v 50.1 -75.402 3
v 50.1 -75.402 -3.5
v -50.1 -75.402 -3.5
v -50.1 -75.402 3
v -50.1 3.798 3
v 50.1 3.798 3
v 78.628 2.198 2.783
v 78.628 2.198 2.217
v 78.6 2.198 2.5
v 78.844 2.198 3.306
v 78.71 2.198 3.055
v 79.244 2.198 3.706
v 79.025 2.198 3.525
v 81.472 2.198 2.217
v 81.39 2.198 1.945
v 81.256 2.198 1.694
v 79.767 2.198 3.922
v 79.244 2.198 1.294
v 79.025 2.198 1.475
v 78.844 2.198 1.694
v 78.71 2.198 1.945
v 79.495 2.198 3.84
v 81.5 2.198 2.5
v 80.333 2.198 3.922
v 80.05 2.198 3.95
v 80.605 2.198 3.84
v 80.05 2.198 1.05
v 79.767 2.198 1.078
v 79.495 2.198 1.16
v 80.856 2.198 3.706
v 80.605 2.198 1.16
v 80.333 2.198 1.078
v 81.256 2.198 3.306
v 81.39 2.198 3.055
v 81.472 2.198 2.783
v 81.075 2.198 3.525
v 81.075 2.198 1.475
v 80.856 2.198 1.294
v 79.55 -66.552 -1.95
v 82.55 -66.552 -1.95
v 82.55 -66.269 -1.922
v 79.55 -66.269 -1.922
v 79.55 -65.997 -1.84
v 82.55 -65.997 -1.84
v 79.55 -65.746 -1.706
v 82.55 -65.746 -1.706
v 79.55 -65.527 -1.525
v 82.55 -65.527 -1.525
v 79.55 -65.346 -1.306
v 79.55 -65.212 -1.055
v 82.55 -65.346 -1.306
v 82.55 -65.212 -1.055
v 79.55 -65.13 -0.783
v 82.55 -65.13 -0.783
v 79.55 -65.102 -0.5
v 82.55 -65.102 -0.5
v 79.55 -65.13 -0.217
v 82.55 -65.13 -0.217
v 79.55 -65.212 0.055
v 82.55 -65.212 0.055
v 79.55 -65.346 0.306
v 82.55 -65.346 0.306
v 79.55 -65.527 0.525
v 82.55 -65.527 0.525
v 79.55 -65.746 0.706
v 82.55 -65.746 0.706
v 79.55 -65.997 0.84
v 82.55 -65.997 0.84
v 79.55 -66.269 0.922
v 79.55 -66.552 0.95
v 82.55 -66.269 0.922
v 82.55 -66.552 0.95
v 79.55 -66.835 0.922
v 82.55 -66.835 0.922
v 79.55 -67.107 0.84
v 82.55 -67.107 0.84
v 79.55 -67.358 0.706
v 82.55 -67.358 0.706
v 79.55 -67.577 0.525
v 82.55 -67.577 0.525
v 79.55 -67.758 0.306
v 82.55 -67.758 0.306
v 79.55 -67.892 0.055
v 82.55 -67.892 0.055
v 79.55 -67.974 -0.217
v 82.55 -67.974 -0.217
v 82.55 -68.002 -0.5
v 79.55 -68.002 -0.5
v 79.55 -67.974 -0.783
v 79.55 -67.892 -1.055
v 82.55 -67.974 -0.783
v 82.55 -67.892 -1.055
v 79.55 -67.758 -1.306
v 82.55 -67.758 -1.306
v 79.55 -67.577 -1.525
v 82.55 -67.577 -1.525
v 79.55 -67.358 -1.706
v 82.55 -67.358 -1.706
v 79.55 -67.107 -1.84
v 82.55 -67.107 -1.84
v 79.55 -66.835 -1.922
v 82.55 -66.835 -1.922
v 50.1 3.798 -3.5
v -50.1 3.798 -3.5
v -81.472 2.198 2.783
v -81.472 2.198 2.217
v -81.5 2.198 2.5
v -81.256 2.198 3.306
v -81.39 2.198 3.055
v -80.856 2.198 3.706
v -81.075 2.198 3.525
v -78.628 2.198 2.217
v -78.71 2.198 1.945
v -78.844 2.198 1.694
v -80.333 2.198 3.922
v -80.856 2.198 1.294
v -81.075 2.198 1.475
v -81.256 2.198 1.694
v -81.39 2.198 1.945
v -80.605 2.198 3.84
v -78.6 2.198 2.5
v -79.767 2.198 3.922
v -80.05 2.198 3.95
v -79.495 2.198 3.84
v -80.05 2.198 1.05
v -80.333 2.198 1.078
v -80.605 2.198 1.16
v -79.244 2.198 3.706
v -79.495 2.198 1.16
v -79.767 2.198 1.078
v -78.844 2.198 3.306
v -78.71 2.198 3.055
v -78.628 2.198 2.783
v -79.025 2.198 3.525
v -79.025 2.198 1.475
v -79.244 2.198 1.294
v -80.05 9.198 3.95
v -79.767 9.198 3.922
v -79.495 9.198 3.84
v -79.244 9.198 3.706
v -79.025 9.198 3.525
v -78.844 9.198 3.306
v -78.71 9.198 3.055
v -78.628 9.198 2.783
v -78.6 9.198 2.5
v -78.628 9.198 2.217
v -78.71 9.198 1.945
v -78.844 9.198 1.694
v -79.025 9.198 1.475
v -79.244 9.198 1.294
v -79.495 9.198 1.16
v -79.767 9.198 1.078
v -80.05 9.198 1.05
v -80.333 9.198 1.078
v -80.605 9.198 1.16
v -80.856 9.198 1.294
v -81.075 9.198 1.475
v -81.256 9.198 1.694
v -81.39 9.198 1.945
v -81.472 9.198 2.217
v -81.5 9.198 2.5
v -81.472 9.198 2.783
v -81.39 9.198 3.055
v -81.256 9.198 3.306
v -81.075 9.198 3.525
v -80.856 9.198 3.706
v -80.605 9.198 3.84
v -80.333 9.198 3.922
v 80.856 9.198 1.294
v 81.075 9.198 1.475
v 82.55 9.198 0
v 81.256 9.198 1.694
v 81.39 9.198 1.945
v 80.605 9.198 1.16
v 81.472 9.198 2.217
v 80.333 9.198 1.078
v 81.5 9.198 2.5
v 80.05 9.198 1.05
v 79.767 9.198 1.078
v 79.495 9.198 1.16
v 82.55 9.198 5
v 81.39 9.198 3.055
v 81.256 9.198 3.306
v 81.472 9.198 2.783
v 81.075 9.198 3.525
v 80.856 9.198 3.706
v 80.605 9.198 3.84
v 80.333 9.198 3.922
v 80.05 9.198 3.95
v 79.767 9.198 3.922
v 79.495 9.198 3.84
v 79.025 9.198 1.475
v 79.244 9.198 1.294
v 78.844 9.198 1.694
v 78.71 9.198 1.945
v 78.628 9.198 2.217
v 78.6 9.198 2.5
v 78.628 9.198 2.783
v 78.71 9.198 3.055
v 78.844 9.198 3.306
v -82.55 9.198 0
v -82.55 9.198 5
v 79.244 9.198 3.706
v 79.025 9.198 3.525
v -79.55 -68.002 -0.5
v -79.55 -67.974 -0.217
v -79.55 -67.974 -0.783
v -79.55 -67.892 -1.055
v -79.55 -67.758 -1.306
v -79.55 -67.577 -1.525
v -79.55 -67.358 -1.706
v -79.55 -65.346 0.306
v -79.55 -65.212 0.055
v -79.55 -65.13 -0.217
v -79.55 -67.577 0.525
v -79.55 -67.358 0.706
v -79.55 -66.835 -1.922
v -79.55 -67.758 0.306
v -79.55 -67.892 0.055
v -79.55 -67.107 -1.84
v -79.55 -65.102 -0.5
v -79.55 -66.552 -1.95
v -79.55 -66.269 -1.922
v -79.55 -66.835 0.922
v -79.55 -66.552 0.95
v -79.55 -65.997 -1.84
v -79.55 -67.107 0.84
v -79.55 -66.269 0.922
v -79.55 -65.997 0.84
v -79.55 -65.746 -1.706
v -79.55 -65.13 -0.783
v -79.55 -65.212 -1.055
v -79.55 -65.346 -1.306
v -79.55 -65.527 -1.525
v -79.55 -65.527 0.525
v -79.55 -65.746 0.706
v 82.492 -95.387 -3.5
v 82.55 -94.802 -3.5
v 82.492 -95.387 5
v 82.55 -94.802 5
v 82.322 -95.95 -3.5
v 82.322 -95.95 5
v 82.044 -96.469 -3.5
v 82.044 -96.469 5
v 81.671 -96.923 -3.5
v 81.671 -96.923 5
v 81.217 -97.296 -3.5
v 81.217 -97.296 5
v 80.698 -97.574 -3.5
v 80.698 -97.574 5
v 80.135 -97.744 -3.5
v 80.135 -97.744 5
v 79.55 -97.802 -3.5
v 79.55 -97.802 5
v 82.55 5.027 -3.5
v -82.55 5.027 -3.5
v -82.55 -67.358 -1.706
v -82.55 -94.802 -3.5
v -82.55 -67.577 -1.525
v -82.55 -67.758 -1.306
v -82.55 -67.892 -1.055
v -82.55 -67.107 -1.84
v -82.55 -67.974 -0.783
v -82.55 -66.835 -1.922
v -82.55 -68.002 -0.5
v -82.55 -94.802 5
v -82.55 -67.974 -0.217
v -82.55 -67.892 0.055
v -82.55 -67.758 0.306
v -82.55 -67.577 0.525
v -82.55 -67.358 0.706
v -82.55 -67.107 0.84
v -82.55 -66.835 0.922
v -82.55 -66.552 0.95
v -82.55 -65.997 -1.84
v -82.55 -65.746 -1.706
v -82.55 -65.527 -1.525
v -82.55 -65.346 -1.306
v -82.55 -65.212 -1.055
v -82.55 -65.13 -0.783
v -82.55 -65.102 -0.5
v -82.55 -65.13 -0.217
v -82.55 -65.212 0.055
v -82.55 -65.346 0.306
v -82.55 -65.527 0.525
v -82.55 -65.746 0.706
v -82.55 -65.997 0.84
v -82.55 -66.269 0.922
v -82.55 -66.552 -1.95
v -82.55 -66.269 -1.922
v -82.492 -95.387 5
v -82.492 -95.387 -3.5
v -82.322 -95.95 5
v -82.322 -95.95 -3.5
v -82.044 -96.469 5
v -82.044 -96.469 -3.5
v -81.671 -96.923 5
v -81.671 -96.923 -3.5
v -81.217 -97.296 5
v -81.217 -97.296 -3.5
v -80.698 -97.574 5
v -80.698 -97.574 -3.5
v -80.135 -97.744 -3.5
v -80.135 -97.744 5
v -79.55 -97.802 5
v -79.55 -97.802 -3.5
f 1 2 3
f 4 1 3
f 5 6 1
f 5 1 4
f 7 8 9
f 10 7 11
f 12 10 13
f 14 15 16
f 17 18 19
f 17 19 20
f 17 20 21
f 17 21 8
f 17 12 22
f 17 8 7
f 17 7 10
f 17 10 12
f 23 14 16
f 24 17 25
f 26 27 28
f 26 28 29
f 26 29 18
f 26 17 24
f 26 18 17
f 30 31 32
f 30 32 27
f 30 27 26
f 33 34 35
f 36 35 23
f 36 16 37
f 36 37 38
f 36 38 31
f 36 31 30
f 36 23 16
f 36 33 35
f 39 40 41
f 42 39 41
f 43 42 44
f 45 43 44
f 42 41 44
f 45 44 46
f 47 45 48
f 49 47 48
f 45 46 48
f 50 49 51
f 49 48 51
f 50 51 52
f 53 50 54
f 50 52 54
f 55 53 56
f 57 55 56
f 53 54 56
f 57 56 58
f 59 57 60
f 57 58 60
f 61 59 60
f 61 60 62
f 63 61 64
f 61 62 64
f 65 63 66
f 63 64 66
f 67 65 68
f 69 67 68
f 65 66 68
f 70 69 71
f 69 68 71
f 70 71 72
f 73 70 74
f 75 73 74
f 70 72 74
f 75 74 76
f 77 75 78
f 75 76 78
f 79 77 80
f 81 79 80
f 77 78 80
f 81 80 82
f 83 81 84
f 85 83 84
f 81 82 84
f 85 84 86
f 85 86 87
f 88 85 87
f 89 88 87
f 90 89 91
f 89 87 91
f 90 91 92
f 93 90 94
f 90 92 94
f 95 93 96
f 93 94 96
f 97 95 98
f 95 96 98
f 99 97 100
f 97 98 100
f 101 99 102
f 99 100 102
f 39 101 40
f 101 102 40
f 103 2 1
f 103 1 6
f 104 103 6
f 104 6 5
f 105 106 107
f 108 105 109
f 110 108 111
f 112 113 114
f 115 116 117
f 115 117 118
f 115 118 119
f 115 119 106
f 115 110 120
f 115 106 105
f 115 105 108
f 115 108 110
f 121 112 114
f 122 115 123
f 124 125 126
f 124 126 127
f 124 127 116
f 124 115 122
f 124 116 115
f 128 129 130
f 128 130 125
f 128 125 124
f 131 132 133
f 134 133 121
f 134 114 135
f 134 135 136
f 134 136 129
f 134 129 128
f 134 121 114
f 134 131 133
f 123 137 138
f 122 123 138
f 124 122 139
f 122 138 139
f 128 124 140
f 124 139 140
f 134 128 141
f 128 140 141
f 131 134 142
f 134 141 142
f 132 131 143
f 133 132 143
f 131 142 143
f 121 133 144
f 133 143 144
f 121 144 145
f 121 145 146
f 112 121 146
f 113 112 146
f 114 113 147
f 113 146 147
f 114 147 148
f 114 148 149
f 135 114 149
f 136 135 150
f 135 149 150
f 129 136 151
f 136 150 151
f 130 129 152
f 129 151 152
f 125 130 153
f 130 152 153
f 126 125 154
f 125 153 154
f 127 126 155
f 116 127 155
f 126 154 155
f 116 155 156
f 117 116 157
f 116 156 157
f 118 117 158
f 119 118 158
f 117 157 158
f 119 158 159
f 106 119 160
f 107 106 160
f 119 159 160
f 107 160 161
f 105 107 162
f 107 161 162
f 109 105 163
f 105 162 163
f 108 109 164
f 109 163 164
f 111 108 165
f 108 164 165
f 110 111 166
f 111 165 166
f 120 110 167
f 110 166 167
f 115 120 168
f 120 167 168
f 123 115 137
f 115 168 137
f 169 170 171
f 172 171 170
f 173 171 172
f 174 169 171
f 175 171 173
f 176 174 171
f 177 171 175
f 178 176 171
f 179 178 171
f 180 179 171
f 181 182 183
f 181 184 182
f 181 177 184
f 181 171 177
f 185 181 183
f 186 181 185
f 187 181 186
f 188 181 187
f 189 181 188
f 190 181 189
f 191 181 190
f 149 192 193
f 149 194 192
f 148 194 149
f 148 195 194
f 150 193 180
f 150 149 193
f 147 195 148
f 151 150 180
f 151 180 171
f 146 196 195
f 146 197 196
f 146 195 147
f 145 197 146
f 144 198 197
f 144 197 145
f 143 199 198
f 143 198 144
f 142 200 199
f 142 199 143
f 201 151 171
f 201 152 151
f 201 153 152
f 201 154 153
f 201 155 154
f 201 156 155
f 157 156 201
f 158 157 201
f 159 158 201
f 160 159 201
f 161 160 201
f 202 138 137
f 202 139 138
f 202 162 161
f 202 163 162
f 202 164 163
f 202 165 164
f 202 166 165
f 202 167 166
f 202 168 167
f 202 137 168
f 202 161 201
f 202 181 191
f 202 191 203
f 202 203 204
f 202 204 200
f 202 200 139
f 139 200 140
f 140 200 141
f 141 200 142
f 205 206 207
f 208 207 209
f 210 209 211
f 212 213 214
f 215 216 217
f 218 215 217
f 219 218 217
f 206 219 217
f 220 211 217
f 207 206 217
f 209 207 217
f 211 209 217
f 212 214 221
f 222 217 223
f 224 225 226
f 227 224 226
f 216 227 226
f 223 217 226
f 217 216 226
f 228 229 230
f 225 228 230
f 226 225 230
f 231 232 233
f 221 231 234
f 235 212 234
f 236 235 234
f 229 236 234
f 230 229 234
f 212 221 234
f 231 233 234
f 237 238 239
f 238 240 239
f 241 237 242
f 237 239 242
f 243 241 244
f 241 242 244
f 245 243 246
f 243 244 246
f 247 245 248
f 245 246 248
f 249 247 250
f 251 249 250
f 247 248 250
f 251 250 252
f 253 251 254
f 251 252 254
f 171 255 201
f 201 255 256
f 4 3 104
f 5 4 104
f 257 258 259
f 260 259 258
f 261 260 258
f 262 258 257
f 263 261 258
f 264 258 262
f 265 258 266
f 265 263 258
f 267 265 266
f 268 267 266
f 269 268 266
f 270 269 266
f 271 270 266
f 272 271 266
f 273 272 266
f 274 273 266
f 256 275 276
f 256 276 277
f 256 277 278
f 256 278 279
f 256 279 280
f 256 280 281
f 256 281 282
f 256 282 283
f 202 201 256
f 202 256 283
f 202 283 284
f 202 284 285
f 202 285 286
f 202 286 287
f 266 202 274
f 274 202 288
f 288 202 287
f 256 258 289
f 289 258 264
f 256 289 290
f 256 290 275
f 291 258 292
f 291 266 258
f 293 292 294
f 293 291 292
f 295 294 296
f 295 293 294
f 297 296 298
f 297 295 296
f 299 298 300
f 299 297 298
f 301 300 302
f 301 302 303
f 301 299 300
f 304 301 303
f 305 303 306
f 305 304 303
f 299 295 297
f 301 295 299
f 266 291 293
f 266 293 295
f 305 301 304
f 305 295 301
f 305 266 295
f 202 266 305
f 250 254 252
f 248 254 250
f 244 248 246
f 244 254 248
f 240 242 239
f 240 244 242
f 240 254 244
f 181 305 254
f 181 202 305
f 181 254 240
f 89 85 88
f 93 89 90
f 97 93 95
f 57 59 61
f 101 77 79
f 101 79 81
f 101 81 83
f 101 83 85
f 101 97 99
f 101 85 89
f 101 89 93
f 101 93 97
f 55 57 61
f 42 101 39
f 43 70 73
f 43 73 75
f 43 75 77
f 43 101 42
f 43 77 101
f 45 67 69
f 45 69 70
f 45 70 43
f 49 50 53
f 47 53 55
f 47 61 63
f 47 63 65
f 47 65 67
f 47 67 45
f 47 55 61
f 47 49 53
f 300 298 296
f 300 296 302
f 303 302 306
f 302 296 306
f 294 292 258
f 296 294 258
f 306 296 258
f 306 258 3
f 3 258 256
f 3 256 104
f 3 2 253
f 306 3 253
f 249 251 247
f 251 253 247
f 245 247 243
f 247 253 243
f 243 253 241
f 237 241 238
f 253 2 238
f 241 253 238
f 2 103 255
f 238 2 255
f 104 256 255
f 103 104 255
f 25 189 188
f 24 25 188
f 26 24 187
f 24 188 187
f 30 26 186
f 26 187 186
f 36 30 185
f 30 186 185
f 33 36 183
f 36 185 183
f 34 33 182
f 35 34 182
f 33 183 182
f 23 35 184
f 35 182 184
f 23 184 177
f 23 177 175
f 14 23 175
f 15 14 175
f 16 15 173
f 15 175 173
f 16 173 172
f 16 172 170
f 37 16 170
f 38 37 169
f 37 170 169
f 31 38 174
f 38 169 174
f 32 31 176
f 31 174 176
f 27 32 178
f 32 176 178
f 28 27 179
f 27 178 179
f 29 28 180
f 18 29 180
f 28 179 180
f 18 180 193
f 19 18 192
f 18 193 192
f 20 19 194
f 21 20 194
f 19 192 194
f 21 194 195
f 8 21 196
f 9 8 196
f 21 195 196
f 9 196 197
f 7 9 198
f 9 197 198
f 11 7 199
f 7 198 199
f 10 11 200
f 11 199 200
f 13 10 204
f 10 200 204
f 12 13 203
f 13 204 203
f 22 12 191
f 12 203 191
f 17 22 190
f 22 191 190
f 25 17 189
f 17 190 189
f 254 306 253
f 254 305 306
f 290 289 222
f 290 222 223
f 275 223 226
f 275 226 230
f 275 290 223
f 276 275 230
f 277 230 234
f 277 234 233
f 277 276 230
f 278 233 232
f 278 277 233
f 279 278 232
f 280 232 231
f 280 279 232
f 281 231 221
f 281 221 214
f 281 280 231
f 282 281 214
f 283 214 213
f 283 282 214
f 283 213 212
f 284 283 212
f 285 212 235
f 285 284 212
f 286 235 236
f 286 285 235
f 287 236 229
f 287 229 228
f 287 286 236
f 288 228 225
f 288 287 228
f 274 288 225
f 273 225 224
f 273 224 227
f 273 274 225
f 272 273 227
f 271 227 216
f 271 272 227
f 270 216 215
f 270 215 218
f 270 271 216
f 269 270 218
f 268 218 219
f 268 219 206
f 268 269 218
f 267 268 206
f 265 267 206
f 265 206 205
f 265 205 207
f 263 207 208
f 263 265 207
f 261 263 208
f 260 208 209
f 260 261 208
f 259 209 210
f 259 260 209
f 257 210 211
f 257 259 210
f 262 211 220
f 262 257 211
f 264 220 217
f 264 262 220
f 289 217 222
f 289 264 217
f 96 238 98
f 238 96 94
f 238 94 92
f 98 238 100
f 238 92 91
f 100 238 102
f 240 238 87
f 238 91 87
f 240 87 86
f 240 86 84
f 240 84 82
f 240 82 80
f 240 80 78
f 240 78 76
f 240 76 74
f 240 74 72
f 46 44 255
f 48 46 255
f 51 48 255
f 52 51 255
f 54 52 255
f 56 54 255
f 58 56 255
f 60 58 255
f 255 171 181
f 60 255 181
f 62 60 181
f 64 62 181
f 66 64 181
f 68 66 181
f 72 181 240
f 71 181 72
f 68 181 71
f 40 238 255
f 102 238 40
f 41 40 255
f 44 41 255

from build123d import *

# Parameters (mm, degrees)
SKETCH1_W           = 165.1
SKETCH1_H           = 90
BOSS_EXTRUDE1_DEPTH = 5
SKETCH2_R           = 1.45
CUT_EXTRUDE1_DEPTH  = 7
SKETCH4_W           = 165.1
SKETCH4_H           = 90
BOSS_EXTRUDE2_DEPTH = 3.5
CHAMFER1_SIZE       = 3.5
CHAMFER1_SIZE2      = 4.171137574
SKETCH5_W           = 100.2
SKETCH5_H           = 79.2
CUT_EXTRUDE3_DEPTH  = 6.5
SKETCH8_R           = 1.45
CUT_EXTRUDE5_DEPTH  = 3
SKETCH10_W          = 165.1
SKETCH10_H          = 8.5
BOSS_EXTRUDE4_DEPTH = 17
FILLET1_R           = 3


with BuildPart() as part:
    # Sketch1 → Boss-Extrude1 (new body)
    with BuildSketch(Plane.XY):
        with Locations((0, -35.801949153)):
            Rectangle(SKETCH1_W, SKETCH1_H)
    extrude(amount=BOSS_EXTRUDE1_DEPTH)

    # Sketch2 → Cut-Extrude1 (cut)
    with BuildSketch(Plane(origin=(0, 9.198050847, 0), x_dir=(1, 0, 0), z_dir=(0, 1, 0))):
        with Locations(Location((-80.05, -2.5, 0), (0, 0, 270))):
            Circle(SKETCH2_R)
        with Locations(Location((80.05, -2.5, 0), (0, 0, 270))):
            Circle(SKETCH2_R)
    extrude(amount=-CUT_EXTRUDE1_DEPTH, mode=Mode.SUBTRACT)

    # Sketch4 → Boss-Extrude2 (add)
    with BuildSketch(Plane(origin=(0, 0, 0), x_dir=(-1, 0, 0), z_dir=(0, 0, -1))):
        with Locations((0, -35.801949153)):
            Rectangle(SKETCH4_W, SKETCH4_H)
    extrude(amount=BOSS_EXTRUDE2_DEPTH)

    # Chamfer1
    chamfer1_edges = [part.edges().sort_by_distance(p)[0] for p in [
        (0, 9.198050847, -3.5),
    ]]
    chamfer1_side = [part.faces().sort_by_distance(p)[0] for p in [
        (0, 9.198050847, 0.733369875),
    ]]
    chamfer(chamfer1_edges, length=CHAMFER1_SIZE, length2=CHAMFER1_SIZE2, reference=chamfer1_side[0])

    # Sketch5 → Cut-Extrude3 (cut)
    with BuildSketch(Plane(origin=(0, 0, -3.5), x_dir=(-1, 0, 0), z_dir=(0, 0, -1))):
        with Locations((0, -35.801949153)):
            Rectangle(SKETCH5_W, SKETCH5_H)
    extrude(amount=-CUT_EXTRUDE3_DEPTH, mode=Mode.SUBTRACT)

    # Sketch8 → Cut-Extrude5 (cut)
    with BuildSketch(Plane(origin=(82.55, 0, 0), x_dir=(0, 0, -1), z_dir=(1, 0, 0))):
        with Locations((0.5, -66.551949153)):
            Circle(SKETCH8_R)
    cut_extrude5 = extrude(amount=-CUT_EXTRUDE5_DEPTH, mode=Mode.SUBTRACT)

    # Mirror2: Cut-Extrude5 across plane
    add(cut_extrude5.mirror(Plane(origin=(0, 0, 0), x_dir=(0, 0, 1), z_dir=(1, 0, 0))), mode=Mode.SUBTRACT)

    # Sketch10 → Boss-Extrude4 (add)
    with BuildSketch(Plane.XZ.offset(80.801949153)):
        with Locations((0, 0.75)):
            Rectangle(SKETCH10_W, SKETCH10_H)
    extrude(amount=BOSS_EXTRUDE4_DEPTH)

    # Fillet1
    fillet1_edges = [part.edges().sort_by_distance(p)[0] for p in [
        (-82.55, -97.801949153, 0.75),
        (82.55, -97.801949153, 0.75),
    ]]
    fillet(fillet1_edges, radius=FILLET1_R)


solid = part.part
